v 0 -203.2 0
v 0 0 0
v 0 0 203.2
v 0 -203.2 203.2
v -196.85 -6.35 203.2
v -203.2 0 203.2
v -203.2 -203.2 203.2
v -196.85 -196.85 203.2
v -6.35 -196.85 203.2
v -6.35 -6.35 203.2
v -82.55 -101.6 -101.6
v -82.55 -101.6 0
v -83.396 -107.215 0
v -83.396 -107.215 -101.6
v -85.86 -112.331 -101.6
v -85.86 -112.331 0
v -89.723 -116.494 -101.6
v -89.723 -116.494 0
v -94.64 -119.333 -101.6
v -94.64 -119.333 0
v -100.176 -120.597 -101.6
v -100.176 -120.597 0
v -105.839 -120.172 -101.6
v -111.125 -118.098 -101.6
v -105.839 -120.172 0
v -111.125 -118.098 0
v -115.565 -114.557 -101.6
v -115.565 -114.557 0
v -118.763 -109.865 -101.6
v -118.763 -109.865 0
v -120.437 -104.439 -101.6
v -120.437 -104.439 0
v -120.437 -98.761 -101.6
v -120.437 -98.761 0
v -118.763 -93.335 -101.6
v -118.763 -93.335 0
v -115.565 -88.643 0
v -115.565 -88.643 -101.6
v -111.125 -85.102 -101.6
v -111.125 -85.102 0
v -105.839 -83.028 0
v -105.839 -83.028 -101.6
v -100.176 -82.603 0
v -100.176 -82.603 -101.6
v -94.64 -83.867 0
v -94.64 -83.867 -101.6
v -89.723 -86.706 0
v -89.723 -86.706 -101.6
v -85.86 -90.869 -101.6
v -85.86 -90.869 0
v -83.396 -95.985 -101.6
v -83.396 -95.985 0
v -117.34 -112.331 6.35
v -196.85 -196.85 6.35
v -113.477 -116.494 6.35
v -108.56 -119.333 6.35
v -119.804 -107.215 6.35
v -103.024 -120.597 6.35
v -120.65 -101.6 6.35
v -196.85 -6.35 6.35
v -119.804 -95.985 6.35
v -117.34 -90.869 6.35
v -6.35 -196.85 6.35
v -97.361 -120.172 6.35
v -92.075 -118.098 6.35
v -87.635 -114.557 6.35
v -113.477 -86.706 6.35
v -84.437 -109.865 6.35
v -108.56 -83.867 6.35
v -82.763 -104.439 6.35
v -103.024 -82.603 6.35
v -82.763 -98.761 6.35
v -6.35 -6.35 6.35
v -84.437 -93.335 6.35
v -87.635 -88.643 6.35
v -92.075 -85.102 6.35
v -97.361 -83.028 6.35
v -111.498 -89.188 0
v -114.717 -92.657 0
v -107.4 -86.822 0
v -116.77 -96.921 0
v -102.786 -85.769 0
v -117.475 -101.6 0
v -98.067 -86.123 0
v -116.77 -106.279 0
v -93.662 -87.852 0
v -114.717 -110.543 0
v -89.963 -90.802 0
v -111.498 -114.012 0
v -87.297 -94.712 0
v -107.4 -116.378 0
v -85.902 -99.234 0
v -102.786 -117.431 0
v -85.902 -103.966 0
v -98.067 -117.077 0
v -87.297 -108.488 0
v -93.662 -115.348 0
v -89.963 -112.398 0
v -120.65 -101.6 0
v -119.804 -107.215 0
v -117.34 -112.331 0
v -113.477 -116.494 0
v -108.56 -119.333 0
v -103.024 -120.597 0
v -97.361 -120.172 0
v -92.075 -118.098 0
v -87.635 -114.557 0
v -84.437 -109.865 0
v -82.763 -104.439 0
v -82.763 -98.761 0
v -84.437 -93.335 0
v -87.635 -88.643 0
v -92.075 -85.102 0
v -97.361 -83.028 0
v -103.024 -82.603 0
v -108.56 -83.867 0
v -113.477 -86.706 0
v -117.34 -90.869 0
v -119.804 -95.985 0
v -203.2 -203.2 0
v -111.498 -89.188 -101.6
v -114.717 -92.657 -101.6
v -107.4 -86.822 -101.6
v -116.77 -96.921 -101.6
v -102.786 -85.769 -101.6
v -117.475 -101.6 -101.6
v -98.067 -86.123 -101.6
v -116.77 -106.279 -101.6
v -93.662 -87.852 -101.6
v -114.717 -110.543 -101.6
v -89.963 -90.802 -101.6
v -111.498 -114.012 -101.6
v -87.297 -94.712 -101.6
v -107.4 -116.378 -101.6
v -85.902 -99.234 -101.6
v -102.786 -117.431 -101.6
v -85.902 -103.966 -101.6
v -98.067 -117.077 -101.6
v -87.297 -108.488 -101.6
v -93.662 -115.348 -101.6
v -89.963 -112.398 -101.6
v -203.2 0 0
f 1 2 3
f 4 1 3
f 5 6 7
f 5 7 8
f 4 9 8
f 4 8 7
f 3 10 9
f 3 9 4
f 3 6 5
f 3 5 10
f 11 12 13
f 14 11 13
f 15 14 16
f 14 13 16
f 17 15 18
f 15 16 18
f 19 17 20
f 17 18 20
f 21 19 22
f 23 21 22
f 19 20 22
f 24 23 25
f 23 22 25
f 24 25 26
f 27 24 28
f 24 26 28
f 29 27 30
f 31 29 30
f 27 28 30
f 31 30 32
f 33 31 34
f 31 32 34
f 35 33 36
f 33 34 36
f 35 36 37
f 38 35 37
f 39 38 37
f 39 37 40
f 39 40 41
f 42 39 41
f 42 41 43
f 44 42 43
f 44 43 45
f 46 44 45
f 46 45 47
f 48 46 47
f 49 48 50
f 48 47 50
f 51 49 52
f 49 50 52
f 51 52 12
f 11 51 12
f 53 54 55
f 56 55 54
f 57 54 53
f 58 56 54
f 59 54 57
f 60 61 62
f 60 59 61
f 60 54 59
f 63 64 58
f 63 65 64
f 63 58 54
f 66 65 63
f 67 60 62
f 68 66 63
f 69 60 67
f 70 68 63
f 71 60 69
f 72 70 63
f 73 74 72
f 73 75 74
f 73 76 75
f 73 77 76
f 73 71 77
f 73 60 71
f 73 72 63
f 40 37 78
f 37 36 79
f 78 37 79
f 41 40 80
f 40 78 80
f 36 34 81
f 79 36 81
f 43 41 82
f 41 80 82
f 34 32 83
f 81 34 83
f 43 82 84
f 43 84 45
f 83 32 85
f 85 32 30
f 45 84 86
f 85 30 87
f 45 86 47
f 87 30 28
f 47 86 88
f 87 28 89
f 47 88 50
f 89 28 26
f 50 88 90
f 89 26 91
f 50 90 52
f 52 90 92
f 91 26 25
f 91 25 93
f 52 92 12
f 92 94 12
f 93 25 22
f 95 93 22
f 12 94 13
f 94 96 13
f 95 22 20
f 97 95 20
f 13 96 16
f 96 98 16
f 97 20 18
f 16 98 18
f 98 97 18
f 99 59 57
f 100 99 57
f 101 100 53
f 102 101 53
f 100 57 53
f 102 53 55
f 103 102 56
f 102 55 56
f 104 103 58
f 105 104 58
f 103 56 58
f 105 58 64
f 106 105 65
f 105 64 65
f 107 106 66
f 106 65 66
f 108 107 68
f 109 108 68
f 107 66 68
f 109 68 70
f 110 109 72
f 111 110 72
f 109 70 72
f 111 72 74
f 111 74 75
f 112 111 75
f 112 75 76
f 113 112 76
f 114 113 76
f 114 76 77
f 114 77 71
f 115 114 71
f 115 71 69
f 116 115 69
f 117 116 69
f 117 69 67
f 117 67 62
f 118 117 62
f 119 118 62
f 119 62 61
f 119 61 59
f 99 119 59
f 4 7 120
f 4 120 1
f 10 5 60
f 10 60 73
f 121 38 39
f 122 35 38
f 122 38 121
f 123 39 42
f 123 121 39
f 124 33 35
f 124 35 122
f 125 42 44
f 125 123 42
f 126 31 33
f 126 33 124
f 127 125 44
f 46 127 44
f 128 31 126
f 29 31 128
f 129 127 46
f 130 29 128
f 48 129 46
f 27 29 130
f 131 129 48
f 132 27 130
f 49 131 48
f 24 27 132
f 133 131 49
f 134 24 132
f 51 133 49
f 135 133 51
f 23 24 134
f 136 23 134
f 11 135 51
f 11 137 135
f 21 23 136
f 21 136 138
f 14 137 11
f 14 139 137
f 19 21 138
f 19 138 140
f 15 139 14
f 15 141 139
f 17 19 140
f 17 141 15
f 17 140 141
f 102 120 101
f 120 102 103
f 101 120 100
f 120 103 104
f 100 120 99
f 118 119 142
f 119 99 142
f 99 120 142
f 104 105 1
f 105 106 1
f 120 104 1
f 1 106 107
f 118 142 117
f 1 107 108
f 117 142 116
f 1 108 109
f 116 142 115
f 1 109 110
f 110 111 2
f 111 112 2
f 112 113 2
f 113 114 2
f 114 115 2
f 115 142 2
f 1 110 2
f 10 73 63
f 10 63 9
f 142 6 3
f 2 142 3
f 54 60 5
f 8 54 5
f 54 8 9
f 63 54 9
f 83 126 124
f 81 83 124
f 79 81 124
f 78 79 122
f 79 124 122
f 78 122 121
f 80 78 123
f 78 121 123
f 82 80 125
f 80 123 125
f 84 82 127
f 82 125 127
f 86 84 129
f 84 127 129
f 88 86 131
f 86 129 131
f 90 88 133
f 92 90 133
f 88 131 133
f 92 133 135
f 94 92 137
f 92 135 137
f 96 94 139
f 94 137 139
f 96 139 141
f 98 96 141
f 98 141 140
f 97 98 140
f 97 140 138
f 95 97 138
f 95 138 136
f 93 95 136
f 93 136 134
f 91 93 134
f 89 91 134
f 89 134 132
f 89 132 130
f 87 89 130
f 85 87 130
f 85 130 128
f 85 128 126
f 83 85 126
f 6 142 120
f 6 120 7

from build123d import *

# Parameters (mm, degrees)
F0_W     = 203.2
F0_H     = 203.2
F1_DEPTH = 203.2
F2_T     = -6.35
F4_D     = 38.1
F3_R     = 19.05
F5_DEPTH = 101.6
F6_D     = 31.75


with BuildPart() as f1:
    # F0 (on Front) → F1 (new body)
    with BuildSketch(Plane.XZ):
        with Locations((-101.6, 101.6)):
            Rectangle(F0_W, F0_H)
    extrude(amount=F1_DEPTH)

    # F2
    f2_openings = [f1.faces().sort_by_distance(p)[0] for p in [
        (-101.6, -101.6, 203.2),
    ]]
    offset(amount=F2_T, openings=f2_openings)

    # F4 (through all)
    with Locations(Plane(origin=(0, 0, 0), x_dir=(1, 0, 0), z_dir=(0, 0, -1))):
        with Locations((-101.6, 101.6)):
            Hole(F4_D / 2)


with BuildPart() as f5:
    # F3 (on face) → F5 (new body)
    with BuildSketch(Plane(origin=(0, 0, 0), x_dir=(1, 0, 0), z_dir=(0, 0, -1))):
        with Locations((-101.6, 101.6)):
            Circle(F3_R)
    extrude(amount=F5_DEPTH)

    # F6 (through all)
    with Locations(Plane.XY):
        with Locations((-101.6, -101.6)):
            Hole(F6_D / 2)


solid = Compound([f1.part, f5.part])
